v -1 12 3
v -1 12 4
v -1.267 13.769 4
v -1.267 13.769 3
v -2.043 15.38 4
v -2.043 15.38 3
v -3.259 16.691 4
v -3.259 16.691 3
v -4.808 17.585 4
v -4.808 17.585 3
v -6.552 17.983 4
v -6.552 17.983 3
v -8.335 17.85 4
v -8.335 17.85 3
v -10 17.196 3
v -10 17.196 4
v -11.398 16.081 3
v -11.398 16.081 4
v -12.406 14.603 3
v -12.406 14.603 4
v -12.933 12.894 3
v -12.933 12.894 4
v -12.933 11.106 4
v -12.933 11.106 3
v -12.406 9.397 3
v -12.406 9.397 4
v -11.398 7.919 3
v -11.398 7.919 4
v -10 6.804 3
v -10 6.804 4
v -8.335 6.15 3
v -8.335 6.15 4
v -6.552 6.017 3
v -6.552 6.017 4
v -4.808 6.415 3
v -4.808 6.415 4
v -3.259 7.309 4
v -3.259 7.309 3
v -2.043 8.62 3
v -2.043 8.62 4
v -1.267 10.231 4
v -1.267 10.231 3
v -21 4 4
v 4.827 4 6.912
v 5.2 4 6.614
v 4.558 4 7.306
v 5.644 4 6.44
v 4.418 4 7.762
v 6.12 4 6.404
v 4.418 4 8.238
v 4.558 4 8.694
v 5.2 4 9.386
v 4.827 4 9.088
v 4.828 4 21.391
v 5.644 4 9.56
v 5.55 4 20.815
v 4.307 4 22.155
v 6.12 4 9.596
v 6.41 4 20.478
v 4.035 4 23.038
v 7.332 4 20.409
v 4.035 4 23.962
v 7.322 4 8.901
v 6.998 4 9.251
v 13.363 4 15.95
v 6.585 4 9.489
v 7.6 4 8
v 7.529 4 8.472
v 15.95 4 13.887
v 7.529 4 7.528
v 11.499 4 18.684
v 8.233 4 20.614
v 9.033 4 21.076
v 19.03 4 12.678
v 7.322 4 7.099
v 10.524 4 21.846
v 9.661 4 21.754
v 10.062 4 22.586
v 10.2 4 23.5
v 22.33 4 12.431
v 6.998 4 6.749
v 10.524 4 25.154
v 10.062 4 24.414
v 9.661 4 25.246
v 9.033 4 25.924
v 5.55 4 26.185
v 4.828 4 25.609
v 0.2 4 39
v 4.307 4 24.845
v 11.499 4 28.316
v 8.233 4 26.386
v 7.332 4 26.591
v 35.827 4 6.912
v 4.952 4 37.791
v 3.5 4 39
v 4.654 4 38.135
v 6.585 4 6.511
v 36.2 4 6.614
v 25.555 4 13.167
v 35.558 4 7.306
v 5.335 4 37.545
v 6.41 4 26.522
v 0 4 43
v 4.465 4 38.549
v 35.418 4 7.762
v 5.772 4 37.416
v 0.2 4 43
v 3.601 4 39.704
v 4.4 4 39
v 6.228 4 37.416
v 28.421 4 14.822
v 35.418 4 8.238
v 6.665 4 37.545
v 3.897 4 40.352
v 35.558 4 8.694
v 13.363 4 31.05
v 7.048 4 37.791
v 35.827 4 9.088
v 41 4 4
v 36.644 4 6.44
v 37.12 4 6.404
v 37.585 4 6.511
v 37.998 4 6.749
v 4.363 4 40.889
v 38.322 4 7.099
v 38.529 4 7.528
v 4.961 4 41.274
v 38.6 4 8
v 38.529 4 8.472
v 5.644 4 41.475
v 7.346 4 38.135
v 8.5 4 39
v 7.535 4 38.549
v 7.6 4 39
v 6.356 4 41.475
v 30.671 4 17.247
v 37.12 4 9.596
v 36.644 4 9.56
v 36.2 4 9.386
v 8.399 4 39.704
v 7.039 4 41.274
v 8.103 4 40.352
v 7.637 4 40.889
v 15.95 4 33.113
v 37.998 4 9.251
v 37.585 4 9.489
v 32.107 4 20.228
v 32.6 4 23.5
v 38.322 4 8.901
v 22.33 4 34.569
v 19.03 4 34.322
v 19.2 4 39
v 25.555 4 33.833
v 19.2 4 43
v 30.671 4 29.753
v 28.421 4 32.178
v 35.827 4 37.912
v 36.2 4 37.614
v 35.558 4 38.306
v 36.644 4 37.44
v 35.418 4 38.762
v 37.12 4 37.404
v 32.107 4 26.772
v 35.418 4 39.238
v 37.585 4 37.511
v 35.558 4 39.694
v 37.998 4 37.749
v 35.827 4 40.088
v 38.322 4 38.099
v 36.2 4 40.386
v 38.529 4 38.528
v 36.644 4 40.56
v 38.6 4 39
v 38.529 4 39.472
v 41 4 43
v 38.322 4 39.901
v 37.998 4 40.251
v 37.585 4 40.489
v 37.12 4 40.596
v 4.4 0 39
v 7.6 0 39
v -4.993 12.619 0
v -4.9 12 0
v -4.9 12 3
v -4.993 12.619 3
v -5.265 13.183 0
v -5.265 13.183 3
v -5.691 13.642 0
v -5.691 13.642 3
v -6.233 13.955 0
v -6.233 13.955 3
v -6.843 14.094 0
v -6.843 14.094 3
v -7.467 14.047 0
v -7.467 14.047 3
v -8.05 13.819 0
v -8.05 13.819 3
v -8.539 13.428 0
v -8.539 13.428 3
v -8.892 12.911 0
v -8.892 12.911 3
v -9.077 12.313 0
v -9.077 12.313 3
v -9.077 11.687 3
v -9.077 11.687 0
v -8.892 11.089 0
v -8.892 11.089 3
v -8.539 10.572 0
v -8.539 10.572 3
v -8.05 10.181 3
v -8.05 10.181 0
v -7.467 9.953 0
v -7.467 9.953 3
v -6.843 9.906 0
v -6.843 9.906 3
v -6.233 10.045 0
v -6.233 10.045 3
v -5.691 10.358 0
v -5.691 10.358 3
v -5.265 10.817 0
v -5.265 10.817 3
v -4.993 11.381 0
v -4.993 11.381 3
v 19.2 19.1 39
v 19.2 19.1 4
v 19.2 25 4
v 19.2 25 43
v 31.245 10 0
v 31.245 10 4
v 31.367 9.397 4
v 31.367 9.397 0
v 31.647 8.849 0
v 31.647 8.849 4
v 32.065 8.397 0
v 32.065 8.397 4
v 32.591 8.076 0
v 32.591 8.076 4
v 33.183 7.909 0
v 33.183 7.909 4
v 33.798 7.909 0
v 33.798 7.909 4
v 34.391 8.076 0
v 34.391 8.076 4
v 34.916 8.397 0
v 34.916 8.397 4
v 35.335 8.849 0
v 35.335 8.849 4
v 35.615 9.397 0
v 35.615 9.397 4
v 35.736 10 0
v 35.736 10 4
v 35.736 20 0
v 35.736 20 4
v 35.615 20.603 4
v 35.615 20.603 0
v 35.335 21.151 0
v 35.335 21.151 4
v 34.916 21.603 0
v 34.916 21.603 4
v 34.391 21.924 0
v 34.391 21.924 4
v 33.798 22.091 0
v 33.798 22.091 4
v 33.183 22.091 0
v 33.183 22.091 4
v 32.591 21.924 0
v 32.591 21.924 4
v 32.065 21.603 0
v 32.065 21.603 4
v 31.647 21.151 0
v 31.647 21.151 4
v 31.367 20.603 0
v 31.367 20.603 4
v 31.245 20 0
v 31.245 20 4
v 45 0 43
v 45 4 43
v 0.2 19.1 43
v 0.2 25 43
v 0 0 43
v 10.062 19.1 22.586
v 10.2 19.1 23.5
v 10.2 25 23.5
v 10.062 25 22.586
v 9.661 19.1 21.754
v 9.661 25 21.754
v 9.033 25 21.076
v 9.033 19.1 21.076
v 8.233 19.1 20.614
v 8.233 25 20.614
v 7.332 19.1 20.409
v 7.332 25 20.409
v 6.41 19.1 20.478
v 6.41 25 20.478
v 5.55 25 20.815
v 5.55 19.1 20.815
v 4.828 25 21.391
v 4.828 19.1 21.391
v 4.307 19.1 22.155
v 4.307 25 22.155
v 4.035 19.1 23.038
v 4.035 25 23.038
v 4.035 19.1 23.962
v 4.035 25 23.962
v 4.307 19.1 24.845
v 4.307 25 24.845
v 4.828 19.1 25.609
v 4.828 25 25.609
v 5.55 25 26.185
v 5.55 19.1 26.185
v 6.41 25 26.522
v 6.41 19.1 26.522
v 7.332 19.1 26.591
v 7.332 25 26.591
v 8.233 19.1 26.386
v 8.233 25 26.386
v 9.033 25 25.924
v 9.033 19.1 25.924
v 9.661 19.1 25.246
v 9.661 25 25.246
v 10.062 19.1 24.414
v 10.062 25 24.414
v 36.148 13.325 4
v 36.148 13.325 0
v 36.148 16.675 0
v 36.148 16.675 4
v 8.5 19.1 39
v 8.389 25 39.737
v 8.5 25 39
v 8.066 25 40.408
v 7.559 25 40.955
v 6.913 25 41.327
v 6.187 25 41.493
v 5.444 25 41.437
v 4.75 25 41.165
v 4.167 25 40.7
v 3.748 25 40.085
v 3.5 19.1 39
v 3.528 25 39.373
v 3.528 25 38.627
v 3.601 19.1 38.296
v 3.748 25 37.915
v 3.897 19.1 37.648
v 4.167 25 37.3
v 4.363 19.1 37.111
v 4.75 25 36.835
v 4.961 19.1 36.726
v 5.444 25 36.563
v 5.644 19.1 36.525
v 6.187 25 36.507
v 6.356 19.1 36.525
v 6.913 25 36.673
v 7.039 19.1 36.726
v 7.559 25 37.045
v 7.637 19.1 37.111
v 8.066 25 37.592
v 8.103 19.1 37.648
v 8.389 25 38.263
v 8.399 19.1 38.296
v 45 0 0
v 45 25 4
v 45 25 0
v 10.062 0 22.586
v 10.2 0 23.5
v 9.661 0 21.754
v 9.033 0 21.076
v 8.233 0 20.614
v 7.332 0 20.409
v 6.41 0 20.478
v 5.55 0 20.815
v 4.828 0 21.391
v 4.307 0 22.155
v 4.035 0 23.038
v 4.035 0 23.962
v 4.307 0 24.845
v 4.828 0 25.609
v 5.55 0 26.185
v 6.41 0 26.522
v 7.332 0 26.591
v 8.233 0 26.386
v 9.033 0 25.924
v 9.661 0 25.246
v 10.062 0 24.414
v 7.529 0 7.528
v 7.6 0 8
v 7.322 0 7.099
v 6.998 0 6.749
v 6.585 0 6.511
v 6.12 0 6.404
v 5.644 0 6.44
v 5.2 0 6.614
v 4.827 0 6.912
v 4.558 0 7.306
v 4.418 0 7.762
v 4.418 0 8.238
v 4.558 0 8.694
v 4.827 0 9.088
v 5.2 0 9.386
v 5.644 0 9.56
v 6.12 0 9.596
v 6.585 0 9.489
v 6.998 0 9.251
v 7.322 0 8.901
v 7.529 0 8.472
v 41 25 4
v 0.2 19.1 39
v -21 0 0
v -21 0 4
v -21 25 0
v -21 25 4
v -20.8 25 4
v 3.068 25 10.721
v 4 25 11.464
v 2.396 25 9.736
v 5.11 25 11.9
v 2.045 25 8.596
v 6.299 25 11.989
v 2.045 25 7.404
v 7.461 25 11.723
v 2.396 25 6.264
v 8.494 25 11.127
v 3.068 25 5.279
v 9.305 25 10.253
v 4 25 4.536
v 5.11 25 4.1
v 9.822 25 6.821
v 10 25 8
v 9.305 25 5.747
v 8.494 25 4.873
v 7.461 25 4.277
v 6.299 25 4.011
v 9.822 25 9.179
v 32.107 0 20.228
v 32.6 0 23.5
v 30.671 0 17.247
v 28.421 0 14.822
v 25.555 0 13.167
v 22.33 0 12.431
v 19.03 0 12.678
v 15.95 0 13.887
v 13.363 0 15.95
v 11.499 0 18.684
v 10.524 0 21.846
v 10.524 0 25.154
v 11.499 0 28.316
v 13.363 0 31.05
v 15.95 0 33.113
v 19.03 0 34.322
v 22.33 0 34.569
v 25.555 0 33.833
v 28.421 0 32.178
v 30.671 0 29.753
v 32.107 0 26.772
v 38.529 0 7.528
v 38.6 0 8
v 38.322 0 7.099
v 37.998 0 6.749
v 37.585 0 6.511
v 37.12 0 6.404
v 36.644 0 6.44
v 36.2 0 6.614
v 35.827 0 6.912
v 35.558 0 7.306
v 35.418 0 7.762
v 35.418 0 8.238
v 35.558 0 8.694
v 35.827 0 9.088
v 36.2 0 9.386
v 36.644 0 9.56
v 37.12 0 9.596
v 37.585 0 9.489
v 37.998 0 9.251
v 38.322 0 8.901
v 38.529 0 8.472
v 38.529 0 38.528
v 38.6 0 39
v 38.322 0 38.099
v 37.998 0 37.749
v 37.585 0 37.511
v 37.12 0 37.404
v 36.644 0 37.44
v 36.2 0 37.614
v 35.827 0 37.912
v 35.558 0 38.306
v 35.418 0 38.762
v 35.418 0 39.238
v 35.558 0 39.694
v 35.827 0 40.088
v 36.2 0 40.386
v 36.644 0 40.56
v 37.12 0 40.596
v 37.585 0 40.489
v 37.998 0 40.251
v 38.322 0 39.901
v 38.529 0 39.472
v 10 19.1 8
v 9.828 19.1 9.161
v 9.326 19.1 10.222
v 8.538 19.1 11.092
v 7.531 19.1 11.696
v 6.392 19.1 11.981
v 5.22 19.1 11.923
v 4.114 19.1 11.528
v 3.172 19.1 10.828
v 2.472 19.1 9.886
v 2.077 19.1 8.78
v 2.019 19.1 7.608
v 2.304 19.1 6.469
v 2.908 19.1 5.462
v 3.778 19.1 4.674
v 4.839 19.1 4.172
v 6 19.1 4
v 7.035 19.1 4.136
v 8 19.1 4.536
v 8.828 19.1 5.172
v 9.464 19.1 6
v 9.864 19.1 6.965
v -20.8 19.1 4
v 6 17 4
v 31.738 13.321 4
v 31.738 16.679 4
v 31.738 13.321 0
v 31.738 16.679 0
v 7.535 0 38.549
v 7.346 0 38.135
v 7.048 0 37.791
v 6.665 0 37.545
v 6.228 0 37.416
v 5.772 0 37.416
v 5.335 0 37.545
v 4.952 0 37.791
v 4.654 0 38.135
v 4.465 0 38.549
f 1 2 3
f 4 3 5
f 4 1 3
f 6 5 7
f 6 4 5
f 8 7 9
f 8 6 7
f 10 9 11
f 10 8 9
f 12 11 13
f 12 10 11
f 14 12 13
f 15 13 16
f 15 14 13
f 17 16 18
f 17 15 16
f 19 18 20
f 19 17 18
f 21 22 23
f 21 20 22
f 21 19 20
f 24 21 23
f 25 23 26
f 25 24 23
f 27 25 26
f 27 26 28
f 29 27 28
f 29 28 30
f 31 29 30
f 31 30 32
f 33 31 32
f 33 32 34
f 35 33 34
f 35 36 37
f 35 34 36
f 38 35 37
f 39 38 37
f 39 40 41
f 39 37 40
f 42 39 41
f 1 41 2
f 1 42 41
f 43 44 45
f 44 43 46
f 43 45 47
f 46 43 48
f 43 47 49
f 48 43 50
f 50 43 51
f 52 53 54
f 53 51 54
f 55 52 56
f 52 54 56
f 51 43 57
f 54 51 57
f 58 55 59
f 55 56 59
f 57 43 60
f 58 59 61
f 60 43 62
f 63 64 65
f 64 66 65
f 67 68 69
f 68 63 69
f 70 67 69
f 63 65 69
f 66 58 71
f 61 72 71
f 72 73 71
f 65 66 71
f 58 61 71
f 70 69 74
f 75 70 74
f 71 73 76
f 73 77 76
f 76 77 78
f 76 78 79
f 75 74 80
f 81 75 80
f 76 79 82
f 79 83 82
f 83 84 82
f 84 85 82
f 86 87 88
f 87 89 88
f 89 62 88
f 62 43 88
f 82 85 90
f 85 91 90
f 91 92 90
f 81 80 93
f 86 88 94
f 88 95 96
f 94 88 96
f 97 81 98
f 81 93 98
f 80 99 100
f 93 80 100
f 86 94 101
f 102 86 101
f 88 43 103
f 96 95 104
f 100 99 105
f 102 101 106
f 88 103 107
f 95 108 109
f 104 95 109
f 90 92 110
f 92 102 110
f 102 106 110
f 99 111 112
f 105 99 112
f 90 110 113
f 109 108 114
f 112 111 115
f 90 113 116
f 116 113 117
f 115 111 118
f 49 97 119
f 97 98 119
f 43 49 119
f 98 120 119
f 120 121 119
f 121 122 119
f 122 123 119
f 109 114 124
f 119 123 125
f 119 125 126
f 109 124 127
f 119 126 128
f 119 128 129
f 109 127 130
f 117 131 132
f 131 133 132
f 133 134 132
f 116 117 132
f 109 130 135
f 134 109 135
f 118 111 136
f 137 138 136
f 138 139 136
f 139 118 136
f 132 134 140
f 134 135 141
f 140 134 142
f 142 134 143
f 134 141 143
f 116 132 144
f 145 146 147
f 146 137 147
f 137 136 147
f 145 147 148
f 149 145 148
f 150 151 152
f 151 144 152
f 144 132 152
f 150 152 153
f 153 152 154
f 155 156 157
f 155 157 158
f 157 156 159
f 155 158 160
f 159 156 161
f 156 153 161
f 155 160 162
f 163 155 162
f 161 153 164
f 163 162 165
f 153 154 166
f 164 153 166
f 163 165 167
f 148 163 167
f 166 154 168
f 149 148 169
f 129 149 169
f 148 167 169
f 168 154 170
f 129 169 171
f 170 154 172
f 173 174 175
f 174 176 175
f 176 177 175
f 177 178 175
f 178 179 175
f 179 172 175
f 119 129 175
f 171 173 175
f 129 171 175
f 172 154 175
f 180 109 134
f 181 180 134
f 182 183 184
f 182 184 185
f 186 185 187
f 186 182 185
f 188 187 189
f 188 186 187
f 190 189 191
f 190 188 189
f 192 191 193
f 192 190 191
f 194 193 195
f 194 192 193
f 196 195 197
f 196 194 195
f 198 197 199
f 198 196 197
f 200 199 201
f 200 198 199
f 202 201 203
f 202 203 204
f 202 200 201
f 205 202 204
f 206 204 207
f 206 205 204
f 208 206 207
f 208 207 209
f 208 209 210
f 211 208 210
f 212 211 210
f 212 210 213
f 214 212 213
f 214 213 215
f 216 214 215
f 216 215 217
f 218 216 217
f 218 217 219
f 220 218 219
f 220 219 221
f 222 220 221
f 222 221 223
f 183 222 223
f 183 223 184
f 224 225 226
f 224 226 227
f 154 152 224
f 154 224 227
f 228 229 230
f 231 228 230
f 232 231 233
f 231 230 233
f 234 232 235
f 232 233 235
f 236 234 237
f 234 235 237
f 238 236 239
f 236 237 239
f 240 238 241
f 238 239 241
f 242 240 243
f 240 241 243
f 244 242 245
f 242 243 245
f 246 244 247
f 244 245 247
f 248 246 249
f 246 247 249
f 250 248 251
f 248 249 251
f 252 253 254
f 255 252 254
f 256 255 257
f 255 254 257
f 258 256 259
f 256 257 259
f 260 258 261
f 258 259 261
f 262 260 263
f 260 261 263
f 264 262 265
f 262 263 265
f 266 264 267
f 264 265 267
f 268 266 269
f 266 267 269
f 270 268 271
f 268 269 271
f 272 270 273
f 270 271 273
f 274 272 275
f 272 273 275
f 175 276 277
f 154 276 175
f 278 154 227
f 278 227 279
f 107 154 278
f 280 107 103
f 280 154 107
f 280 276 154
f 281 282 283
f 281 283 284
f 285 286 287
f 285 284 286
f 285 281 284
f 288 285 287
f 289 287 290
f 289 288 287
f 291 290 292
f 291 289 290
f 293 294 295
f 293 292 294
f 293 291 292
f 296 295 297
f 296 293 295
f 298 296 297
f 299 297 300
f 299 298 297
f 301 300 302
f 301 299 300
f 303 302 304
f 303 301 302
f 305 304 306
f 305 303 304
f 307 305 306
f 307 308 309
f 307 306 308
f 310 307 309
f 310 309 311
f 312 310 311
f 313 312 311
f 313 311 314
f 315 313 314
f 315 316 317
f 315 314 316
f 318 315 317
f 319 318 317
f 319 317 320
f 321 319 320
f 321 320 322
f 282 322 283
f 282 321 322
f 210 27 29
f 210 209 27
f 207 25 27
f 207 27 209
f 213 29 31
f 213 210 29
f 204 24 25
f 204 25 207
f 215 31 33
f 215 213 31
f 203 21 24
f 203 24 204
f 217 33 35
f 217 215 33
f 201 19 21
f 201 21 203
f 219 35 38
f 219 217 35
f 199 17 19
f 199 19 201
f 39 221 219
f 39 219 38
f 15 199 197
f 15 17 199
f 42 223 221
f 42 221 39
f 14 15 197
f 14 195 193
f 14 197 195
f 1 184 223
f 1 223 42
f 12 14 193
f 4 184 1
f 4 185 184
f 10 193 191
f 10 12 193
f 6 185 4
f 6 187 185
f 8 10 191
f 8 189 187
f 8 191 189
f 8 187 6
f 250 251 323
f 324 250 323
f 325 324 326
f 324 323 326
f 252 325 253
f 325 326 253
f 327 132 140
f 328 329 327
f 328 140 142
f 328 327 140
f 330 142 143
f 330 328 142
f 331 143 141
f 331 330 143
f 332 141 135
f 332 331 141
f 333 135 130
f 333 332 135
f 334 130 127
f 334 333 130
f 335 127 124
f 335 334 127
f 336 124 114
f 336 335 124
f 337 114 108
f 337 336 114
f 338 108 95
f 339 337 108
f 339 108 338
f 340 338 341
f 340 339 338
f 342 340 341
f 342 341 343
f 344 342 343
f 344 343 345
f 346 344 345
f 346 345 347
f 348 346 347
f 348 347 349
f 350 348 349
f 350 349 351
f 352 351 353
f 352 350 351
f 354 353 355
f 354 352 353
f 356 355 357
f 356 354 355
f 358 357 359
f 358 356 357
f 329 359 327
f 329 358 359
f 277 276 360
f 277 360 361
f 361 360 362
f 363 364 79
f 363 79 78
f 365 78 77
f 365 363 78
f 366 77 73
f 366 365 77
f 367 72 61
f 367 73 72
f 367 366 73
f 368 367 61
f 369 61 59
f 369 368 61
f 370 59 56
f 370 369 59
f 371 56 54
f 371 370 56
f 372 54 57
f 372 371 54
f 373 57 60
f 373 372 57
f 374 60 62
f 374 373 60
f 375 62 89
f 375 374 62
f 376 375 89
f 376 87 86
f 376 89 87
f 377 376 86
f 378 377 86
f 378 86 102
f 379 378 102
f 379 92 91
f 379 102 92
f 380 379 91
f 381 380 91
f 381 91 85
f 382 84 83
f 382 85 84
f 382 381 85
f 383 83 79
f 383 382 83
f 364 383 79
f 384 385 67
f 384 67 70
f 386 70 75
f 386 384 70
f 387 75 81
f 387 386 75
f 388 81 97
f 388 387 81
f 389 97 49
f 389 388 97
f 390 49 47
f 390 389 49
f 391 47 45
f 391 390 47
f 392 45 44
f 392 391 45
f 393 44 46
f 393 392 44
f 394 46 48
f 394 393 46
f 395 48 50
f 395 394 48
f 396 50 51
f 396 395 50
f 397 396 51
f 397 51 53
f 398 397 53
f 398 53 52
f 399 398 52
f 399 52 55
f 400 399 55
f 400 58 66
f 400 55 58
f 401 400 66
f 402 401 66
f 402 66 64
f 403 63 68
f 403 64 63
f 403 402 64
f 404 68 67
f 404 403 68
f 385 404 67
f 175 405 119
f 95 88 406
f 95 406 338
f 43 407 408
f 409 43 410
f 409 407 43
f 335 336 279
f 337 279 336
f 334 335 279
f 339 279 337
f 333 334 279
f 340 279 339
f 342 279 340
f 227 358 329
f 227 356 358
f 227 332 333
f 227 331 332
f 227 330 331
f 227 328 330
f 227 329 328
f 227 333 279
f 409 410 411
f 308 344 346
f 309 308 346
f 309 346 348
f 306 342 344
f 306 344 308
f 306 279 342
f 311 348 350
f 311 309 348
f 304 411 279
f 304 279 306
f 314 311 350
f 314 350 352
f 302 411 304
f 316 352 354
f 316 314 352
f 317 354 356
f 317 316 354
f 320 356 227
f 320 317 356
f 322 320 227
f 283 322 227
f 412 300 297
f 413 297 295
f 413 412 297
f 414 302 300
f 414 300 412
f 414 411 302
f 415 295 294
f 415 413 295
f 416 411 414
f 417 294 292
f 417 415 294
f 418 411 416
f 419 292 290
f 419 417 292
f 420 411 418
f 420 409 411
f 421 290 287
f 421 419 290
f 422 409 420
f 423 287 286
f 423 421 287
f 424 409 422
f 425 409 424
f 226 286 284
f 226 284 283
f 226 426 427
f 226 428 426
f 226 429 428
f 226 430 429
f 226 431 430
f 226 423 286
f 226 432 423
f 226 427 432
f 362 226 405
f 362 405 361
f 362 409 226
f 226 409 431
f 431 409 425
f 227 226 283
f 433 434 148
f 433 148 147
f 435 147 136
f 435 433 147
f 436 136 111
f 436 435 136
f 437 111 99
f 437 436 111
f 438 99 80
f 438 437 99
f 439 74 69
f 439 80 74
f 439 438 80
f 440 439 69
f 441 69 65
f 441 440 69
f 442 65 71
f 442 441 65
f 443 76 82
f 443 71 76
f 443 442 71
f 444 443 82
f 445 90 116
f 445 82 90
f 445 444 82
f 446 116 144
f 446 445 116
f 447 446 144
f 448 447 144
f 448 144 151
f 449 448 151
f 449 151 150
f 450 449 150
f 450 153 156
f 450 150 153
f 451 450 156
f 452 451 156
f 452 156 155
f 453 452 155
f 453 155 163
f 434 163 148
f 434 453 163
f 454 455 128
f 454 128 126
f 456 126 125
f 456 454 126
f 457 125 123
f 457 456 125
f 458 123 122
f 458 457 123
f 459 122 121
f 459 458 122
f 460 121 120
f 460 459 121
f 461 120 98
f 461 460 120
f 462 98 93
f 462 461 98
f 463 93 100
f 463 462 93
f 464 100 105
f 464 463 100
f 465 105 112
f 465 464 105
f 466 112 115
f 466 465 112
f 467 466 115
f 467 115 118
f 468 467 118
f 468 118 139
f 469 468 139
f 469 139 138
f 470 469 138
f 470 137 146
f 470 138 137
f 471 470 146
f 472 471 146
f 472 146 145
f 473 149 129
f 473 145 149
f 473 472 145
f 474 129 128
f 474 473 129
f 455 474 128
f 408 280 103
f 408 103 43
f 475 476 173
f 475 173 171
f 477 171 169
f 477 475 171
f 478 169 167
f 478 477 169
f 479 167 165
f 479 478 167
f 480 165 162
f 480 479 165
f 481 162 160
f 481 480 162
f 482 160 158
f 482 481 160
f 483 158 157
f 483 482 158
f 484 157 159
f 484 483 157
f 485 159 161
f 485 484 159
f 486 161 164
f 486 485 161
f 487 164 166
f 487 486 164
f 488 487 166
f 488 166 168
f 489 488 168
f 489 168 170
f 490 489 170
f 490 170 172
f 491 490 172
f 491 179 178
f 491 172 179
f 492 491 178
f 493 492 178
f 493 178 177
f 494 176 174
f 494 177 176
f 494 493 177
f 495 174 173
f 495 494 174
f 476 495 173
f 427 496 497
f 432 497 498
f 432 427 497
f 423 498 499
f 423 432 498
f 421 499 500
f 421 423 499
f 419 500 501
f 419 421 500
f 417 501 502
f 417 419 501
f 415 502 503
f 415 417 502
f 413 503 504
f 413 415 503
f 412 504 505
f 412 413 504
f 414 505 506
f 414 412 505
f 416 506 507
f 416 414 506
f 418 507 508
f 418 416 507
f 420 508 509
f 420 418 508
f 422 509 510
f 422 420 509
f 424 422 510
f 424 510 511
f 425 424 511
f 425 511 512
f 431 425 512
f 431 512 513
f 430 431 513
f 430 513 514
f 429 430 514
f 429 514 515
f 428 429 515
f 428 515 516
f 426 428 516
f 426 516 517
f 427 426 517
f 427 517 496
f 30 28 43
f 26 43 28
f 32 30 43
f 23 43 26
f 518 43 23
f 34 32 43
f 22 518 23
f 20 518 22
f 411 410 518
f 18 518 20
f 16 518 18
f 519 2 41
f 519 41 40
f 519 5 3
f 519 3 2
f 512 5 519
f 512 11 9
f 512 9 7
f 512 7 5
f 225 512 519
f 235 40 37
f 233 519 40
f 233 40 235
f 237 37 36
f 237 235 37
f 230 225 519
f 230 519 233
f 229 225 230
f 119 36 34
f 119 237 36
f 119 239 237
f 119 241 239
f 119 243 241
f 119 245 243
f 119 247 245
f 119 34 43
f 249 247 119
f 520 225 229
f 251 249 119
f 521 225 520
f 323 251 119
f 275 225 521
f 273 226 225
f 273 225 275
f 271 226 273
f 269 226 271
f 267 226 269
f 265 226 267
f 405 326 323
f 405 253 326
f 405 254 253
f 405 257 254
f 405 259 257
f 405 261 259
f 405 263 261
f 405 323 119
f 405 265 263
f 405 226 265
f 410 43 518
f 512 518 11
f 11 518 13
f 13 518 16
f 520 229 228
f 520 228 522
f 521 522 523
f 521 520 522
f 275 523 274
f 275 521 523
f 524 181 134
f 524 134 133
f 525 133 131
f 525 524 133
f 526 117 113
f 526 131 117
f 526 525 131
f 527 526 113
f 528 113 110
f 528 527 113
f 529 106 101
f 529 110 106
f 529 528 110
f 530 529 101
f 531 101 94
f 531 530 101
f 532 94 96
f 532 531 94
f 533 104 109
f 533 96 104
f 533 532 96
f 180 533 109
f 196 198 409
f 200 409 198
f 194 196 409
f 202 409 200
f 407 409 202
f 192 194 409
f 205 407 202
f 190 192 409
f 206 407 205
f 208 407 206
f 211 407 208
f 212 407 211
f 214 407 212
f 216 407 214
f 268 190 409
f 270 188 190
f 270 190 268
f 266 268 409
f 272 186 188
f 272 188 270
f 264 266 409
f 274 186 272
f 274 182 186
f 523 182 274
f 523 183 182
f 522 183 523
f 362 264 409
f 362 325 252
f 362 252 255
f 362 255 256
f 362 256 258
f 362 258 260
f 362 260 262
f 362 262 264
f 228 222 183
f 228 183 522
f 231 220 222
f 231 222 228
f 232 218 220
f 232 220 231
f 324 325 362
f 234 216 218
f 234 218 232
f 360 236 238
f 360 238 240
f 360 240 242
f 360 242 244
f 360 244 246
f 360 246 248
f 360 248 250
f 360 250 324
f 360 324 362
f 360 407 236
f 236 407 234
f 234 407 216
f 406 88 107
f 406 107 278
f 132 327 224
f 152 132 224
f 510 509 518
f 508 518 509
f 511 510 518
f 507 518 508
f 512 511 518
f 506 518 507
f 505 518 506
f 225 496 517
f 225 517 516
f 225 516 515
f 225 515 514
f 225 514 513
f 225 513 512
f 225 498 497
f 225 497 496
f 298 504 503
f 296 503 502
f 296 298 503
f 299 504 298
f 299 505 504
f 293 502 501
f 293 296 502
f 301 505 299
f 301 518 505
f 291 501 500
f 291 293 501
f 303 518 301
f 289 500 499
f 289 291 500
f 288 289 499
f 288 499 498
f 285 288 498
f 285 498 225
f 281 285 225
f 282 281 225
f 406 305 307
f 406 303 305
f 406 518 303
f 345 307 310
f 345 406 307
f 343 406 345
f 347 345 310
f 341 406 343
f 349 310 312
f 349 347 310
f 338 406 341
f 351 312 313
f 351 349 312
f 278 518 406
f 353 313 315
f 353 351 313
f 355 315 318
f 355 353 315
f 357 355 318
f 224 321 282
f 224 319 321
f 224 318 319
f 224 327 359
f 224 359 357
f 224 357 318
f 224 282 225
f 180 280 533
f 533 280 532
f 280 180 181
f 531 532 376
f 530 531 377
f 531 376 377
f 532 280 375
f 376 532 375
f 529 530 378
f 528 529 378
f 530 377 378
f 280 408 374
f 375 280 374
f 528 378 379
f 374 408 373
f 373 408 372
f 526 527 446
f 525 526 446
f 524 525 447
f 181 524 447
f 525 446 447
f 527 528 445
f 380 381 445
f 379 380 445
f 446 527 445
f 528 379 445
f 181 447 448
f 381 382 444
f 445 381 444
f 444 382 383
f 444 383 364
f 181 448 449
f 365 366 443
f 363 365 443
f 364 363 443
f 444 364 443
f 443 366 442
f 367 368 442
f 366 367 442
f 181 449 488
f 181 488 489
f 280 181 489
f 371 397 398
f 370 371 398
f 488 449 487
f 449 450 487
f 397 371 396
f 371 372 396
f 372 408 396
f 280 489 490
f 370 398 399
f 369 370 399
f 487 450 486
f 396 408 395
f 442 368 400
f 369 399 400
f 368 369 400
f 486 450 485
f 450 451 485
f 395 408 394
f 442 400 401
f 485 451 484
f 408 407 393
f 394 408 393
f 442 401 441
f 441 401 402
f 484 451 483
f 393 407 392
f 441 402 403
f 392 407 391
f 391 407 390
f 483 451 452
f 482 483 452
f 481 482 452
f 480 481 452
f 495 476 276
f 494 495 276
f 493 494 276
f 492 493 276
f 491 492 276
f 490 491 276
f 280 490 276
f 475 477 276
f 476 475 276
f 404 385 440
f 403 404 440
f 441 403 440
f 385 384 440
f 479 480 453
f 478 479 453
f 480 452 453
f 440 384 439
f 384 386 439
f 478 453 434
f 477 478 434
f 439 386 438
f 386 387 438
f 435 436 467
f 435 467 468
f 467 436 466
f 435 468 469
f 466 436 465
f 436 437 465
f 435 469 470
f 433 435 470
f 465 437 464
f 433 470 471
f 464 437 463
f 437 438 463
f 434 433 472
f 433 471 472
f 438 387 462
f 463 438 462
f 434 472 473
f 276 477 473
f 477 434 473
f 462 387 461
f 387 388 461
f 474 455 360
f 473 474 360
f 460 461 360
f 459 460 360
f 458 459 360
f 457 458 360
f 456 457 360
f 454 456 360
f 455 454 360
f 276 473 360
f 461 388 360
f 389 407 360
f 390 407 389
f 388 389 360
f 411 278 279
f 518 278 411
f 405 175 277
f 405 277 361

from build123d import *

# Parameters (mm, degrees)
CYLINDER031_R              = 3.1
CYLINDER031_DEPTH          = 32.5
EXTRUDE002_DEPTH           = 10
CYLINDER038_R              = 2.5
CYLINDER038_DEPTH          = 23
CYLINDER032_R              = 4
CYLINDER032_DEPTH          = 10
EXTRUDE005_DEPTH           = 4
EXTRUDE005_PLACEMENT_ANGLE = 90
CYLINDER019_R              = 11.1
CYLINDER019_DEPTH          = 10
CYLINDER015_R              = 1.6
CYLINDER015_DEPTH          = 10
CYLINDER016_R              = 1.6
CYLINDER016_DEPTH          = 10
CYLINDER017_R              = 1.6
CYLINDER017_DEPTH          = 10
CYLINDER018_R              = 1.6
CYLINDER018_DEPTH          = 10
BOX002_W                   = 44
BOX002_H                   = 4
BOX002_DEPTH               = 43
EXTRUDE001_DEPTH           = 4
EXTRUDE006_DEPTH           = 5.9
EXTRUDE006_PLACEMENT_ANGLE = 90
CYLINDER021_R              = 6
CYLINDER021_DEPTH          = 6
CYLINDER020_R              = 2.1
CYLINDER020_DEPTH          = 10
BOX003_W                   = 66
BOX003_H                   = 25
BOX003_DEPTH               = 4
BOX_W                      = 19
BOX_H                      = 25
BOX_DEPTH                  = 4
CYLINDER028_R              = 11.1
CYLINDER028_DEPTH          = 10
CYLINDER025_R              = 1.6
CYLINDER025_DEPTH          = 10
CYLINDER024_R              = 1.6
CYLINDER024_DEPTH          = 10
CYLINDER023_R              = 1.6
CYLINDER023_DEPTH          = 10
CYLINDER029_R              = 1.6
CYLINDER029_DEPTH          = 10
BOX005_W                   = 44
BOX005_H                   = 4
BOX005_DEPTH               = 43


with BuildPart() as cylinder031:
    # Cylinder031 → Cylinder031 (new body)
    with BuildSketch(Plane(origin=(7.1, -2.84478, 23.5), x_dir=(1, 0, 0), z_dir=(0, 1, 0))):
        Circle(CYLINDER031_R)
    extrude(amount=CYLINDER031_DEPTH)


with BuildPart() as extrude002:
    # Sketch001 → Extrude002 (new body)
    with BuildSketch(Plane.XY):
        with BuildLine():
            ThreePointArc((35.736492, 10), (36.2, 15), (35.736492, 20))
            ThreePointArc((35.736492, 20), (33.490746, 22.111711), (31.244999, 20))
            ThreePointArc((31.244999, 10), (31.8, 15), (31.244999, 20))
            ThreePointArc((31.244999, 10), (33.490746, 7.888289), (35.736492, 10))
        make_face()
    extrude(amount=-EXTRUDE002_DEPTH)


with BuildPart() as extrude002_1:
    # Extrude002 placement: moved
    add(extrude002.part.moved(Location((0, 0, 8))))


with BuildPart() as cylinder038:
    # Cylinder038 → Cylinder038 (new body)
    with BuildSketch(Plane(origin=(6, 27, 39), x_dir=(1, 0, 0), z_dir=(0, -1, 0))):
        Circle(CYLINDER038_R)
    extrude(amount=CYLINDER038_DEPTH)


with BuildPart() as cylinder032:
    # Cylinder032 → Cylinder032 (new body)
    with BuildSketch(Plane(origin=(6, 27, 8), x_dir=(1, 0, 0), z_dir=(0, -1, 0))):
        Circle(CYLINDER032_R)
    extrude(amount=CYLINDER032_DEPTH)


with BuildPart() as extrude005:
    # Sketch003 → Extrude005 (new body)
    with BuildSketch(Plane.YZ):
        Polygon((0, 0), (0, 43), (4, 43), (25, 4), (25, 0), align=None)
    extrude(amount=EXTRUDE005_DEPTH)


with BuildPart() as extrude005_1:
    # Extrude005 placement: moved
    add(extrude005.part.moved(Location((4, 0, 0))).rotate(Axis((4, 0, 0), (0, 0, 1)), EXTRUDE005_PLACEMENT_ANGLE))


with BuildPart() as cylinder019:
    # Cylinder019 → Cylinder019 (new body)
    with BuildSketch(Plane(origin=(21.5, -2, 23.5), x_dir=(1, 0, 0), z_dir=(0, 1, 0))):
        Circle(CYLINDER019_R)
    extrude(amount=CYLINDER019_DEPTH)


with BuildPart() as cylinder015:
    # Cylinder015 → Cylinder015 (new body)
    with BuildSketch(Plane(origin=(37, -3, 8), x_dir=(1, 0, 0), z_dir=(0, 1, 0))):
        Circle(CYLINDER015_R)
    extrude(amount=CYLINDER015_DEPTH)


with BuildPart() as cylinder016:
    # Cylinder016 → Cylinder016 (new body)
    with BuildSketch(Plane(origin=(6, -3, 8), x_dir=(1, 0, 0), z_dir=(0, 1, 0))):
        Circle(CYLINDER016_R)
    extrude(amount=CYLINDER016_DEPTH)


with BuildPart() as cylinder017:
    # Cylinder017 → Cylinder017 (new body)
    with BuildSketch(Plane(origin=(6, -3, 39), x_dir=(1, 0, 0), z_dir=(0, 1, 0))):
        Circle(CYLINDER017_R)
    extrude(amount=CYLINDER017_DEPTH)


with BuildPart() as cylinder018:
    # Cylinder018 → Cylinder018 (new body)
    with BuildSketch(Plane(origin=(37, -3, 39), x_dir=(1, 0, 0), z_dir=(0, 1, 0))):
        Circle(CYLINDER018_R)
    extrude(amount=CYLINDER018_DEPTH)


with BuildPart() as cut014:
    # Box002 → Box002 (new body)
    with BuildSketch(Plane.XY):
        with Locations((22, 2)):
            Rectangle(BOX002_W, BOX002_H)
    extrude(amount=BOX002_DEPTH)

    # Cut010: cut Cylinder018
    add(cylinder018.part, mode=Mode.SUBTRACT)

    # Cut011: cut Cylinder017
    add(cylinder017.part, mode=Mode.SUBTRACT)

    # Cut012: cut Cylinder016
    add(cylinder016.part, mode=Mode.SUBTRACT)

    # Cut013: cut Cylinder015
    add(cylinder015.part, mode=Mode.SUBTRACT)

    # Cut014: cut Cylinder019
    add(cylinder019.part, mode=Mode.SUBTRACT)


with BuildPart() as extrude001:
    # Sketch → Extrude001 (new body)
    with BuildSketch(Plane.YZ):
        Polygon((0, 0), (0, 43), (4, 43), (25, 4), (25, 0), align=None)
    extrude(amount=EXTRUDE001_DEPTH)


with BuildPart() as extrude001_1:
    # Extrude001 placement: moved
    add(extrude001.part.moved(Location((41, 0, 0))))


with BuildPart() as extrude006:
    # Sketch004 → Extrude006 (new body)
    with BuildSketch(Plane.YZ):
        Polygon((0, 0), (0, 43), (19, 43), (40, 4), (40, 0), align=None)
    extrude(amount=EXTRUDE006_DEPTH)


with BuildPart() as extrude006_1:
    # Extrude006 placement: moved
    add(extrude006.part.moved(Location((19.2, 19.1, 0))).rotate(Axis((19.2, 19.1, 0), (0, 0, 1)), EXTRUDE006_PLACEMENT_ANGLE))


with BuildPart() as cylinder021:
    # Cylinder021 → Cylinder021 (new body)
    with BuildSketch(Plane.XY.offset(10)):
        Circle(CYLINDER021_R)
    extrude(amount=CYLINDER021_DEPTH)


with BuildPart() as fusion004:
    # Cylinder020 → Cylinder020 (new body)
    with BuildSketch(Plane.XY):
        Circle(CYLINDER020_R)
    extrude(amount=CYLINDER020_DEPTH)

    # Fusion004: union Cylinder021
    add(cylinder021.part)


with BuildPart() as fusion004_1:
    # Fusion004 placement: moved
    add(fusion004.part.moved(Location((-7, 12, -7))))


with BuildPart() as cut029:
    # Box003 → Box003 (new body)
    with BuildSketch(Plane(origin=(-21, 0, 0), x_dir=(1, 0, 0), z_dir=(0, 0, 1))):
        with Locations((33, 12.5)):
            Rectangle(BOX003_W, BOX003_H)
    extrude(amount=BOX003_DEPTH)

    # Cut: cut Fusion004
    add(fusion004_1.part, mode=Mode.SUBTRACT)

    # Fusion: union Extrude005, Cut014, Extrude001, Extrude006
    add(extrude005_1.part)
    add(cut014.part)
    add(extrude001_1.part)
    add(extrude006_1.part)

    # Cut029: cut Cylinder032
    add(cylinder032.part, mode=Mode.SUBTRACT)


with BuildPart() as box:
    # Box → Box (new body)
    with BuildSketch(Plane(origin=(0.2, 0, 39), x_dir=(1, 0, 0), z_dir=(0, 0, 1))):
        with Locations((9.5, 12.5)):
            Rectangle(BOX_W, BOX_H)
    extrude(amount=BOX_DEPTH)


with BuildPart() as cylinder028:
    # Cylinder028 → Cylinder028 (new body)
    with BuildSketch(Plane(origin=(21.5, -2, 23.5), x_dir=(1, 0, 0), z_dir=(0, 1, 0))):
        Circle(CYLINDER028_R)
    extrude(amount=CYLINDER028_DEPTH)


with BuildPart() as cylinder025:
    # Cylinder025 → Cylinder025 (new body)
    with BuildSketch(Plane(origin=(37, -3, 8), x_dir=(1, 0, 0), z_dir=(0, 1, 0))):
        Circle(CYLINDER025_R)
    extrude(amount=CYLINDER025_DEPTH)


with BuildPart() as cylinder024:
    # Cylinder024 → Cylinder024 (new body)
    with BuildSketch(Plane(origin=(6, -3, 8), x_dir=(1, 0, 0), z_dir=(0, 1, 0))):
        Circle(CYLINDER024_R)
    extrude(amount=CYLINDER024_DEPTH)


with BuildPart() as cylinder023:
    # Cylinder023 → Cylinder023 (new body)
    with BuildSketch(Plane(origin=(6, -3, 39), x_dir=(1, 0, 0), z_dir=(0, 1, 0))):
        Circle(CYLINDER023_R)
    extrude(amount=CYLINDER023_DEPTH)


with BuildPart() as cylinder029:
    # Cylinder029 → Cylinder029 (new body)
    with BuildSketch(Plane(origin=(37, -3, 39), x_dir=(1, 0, 0), z_dir=(0, 1, 0))):
        Circle(CYLINDER029_R)
    extrude(amount=CYLINDER029_DEPTH)


with BuildPart() as cut032:
    # Box005 → Box005 (new body)
    with BuildSketch(Plane.XY):
        with Locations((22, 2)):
            Rectangle(BOX005_W, BOX005_H)
    extrude(amount=BOX005_DEPTH)

    # Cut017: cut Cylinder029
    add(cylinder029.part, mode=Mode.SUBTRACT)

    # Cut018: cut Cylinder023
    add(cylinder023.part, mode=Mode.SUBTRACT)

    # Cut021: cut Cylinder024
    add(cylinder024.part, mode=Mode.SUBTRACT)

    # Cut022: cut Cylinder025
    add(cylinder025.part, mode=Mode.SUBTRACT)

    # Cut016: cut Cylinder028
    add(cylinder028.part, mode=Mode.SUBTRACT)

    # Fusion008: union Box
    add(box.part)

    # Fusion009: union Cut029
    add(cut029.part)

    # Cut030: cut Cylinder038
    add(cylinder038.part, mode=Mode.SUBTRACT)

    # Cut031: cut Extrude002
    add(extrude002_1.part, mode=Mode.SUBTRACT)

    # Cut032: cut Cylinder031
    add(cylinder031.part, mode=Mode.SUBTRACT)


solid = cut032.part
